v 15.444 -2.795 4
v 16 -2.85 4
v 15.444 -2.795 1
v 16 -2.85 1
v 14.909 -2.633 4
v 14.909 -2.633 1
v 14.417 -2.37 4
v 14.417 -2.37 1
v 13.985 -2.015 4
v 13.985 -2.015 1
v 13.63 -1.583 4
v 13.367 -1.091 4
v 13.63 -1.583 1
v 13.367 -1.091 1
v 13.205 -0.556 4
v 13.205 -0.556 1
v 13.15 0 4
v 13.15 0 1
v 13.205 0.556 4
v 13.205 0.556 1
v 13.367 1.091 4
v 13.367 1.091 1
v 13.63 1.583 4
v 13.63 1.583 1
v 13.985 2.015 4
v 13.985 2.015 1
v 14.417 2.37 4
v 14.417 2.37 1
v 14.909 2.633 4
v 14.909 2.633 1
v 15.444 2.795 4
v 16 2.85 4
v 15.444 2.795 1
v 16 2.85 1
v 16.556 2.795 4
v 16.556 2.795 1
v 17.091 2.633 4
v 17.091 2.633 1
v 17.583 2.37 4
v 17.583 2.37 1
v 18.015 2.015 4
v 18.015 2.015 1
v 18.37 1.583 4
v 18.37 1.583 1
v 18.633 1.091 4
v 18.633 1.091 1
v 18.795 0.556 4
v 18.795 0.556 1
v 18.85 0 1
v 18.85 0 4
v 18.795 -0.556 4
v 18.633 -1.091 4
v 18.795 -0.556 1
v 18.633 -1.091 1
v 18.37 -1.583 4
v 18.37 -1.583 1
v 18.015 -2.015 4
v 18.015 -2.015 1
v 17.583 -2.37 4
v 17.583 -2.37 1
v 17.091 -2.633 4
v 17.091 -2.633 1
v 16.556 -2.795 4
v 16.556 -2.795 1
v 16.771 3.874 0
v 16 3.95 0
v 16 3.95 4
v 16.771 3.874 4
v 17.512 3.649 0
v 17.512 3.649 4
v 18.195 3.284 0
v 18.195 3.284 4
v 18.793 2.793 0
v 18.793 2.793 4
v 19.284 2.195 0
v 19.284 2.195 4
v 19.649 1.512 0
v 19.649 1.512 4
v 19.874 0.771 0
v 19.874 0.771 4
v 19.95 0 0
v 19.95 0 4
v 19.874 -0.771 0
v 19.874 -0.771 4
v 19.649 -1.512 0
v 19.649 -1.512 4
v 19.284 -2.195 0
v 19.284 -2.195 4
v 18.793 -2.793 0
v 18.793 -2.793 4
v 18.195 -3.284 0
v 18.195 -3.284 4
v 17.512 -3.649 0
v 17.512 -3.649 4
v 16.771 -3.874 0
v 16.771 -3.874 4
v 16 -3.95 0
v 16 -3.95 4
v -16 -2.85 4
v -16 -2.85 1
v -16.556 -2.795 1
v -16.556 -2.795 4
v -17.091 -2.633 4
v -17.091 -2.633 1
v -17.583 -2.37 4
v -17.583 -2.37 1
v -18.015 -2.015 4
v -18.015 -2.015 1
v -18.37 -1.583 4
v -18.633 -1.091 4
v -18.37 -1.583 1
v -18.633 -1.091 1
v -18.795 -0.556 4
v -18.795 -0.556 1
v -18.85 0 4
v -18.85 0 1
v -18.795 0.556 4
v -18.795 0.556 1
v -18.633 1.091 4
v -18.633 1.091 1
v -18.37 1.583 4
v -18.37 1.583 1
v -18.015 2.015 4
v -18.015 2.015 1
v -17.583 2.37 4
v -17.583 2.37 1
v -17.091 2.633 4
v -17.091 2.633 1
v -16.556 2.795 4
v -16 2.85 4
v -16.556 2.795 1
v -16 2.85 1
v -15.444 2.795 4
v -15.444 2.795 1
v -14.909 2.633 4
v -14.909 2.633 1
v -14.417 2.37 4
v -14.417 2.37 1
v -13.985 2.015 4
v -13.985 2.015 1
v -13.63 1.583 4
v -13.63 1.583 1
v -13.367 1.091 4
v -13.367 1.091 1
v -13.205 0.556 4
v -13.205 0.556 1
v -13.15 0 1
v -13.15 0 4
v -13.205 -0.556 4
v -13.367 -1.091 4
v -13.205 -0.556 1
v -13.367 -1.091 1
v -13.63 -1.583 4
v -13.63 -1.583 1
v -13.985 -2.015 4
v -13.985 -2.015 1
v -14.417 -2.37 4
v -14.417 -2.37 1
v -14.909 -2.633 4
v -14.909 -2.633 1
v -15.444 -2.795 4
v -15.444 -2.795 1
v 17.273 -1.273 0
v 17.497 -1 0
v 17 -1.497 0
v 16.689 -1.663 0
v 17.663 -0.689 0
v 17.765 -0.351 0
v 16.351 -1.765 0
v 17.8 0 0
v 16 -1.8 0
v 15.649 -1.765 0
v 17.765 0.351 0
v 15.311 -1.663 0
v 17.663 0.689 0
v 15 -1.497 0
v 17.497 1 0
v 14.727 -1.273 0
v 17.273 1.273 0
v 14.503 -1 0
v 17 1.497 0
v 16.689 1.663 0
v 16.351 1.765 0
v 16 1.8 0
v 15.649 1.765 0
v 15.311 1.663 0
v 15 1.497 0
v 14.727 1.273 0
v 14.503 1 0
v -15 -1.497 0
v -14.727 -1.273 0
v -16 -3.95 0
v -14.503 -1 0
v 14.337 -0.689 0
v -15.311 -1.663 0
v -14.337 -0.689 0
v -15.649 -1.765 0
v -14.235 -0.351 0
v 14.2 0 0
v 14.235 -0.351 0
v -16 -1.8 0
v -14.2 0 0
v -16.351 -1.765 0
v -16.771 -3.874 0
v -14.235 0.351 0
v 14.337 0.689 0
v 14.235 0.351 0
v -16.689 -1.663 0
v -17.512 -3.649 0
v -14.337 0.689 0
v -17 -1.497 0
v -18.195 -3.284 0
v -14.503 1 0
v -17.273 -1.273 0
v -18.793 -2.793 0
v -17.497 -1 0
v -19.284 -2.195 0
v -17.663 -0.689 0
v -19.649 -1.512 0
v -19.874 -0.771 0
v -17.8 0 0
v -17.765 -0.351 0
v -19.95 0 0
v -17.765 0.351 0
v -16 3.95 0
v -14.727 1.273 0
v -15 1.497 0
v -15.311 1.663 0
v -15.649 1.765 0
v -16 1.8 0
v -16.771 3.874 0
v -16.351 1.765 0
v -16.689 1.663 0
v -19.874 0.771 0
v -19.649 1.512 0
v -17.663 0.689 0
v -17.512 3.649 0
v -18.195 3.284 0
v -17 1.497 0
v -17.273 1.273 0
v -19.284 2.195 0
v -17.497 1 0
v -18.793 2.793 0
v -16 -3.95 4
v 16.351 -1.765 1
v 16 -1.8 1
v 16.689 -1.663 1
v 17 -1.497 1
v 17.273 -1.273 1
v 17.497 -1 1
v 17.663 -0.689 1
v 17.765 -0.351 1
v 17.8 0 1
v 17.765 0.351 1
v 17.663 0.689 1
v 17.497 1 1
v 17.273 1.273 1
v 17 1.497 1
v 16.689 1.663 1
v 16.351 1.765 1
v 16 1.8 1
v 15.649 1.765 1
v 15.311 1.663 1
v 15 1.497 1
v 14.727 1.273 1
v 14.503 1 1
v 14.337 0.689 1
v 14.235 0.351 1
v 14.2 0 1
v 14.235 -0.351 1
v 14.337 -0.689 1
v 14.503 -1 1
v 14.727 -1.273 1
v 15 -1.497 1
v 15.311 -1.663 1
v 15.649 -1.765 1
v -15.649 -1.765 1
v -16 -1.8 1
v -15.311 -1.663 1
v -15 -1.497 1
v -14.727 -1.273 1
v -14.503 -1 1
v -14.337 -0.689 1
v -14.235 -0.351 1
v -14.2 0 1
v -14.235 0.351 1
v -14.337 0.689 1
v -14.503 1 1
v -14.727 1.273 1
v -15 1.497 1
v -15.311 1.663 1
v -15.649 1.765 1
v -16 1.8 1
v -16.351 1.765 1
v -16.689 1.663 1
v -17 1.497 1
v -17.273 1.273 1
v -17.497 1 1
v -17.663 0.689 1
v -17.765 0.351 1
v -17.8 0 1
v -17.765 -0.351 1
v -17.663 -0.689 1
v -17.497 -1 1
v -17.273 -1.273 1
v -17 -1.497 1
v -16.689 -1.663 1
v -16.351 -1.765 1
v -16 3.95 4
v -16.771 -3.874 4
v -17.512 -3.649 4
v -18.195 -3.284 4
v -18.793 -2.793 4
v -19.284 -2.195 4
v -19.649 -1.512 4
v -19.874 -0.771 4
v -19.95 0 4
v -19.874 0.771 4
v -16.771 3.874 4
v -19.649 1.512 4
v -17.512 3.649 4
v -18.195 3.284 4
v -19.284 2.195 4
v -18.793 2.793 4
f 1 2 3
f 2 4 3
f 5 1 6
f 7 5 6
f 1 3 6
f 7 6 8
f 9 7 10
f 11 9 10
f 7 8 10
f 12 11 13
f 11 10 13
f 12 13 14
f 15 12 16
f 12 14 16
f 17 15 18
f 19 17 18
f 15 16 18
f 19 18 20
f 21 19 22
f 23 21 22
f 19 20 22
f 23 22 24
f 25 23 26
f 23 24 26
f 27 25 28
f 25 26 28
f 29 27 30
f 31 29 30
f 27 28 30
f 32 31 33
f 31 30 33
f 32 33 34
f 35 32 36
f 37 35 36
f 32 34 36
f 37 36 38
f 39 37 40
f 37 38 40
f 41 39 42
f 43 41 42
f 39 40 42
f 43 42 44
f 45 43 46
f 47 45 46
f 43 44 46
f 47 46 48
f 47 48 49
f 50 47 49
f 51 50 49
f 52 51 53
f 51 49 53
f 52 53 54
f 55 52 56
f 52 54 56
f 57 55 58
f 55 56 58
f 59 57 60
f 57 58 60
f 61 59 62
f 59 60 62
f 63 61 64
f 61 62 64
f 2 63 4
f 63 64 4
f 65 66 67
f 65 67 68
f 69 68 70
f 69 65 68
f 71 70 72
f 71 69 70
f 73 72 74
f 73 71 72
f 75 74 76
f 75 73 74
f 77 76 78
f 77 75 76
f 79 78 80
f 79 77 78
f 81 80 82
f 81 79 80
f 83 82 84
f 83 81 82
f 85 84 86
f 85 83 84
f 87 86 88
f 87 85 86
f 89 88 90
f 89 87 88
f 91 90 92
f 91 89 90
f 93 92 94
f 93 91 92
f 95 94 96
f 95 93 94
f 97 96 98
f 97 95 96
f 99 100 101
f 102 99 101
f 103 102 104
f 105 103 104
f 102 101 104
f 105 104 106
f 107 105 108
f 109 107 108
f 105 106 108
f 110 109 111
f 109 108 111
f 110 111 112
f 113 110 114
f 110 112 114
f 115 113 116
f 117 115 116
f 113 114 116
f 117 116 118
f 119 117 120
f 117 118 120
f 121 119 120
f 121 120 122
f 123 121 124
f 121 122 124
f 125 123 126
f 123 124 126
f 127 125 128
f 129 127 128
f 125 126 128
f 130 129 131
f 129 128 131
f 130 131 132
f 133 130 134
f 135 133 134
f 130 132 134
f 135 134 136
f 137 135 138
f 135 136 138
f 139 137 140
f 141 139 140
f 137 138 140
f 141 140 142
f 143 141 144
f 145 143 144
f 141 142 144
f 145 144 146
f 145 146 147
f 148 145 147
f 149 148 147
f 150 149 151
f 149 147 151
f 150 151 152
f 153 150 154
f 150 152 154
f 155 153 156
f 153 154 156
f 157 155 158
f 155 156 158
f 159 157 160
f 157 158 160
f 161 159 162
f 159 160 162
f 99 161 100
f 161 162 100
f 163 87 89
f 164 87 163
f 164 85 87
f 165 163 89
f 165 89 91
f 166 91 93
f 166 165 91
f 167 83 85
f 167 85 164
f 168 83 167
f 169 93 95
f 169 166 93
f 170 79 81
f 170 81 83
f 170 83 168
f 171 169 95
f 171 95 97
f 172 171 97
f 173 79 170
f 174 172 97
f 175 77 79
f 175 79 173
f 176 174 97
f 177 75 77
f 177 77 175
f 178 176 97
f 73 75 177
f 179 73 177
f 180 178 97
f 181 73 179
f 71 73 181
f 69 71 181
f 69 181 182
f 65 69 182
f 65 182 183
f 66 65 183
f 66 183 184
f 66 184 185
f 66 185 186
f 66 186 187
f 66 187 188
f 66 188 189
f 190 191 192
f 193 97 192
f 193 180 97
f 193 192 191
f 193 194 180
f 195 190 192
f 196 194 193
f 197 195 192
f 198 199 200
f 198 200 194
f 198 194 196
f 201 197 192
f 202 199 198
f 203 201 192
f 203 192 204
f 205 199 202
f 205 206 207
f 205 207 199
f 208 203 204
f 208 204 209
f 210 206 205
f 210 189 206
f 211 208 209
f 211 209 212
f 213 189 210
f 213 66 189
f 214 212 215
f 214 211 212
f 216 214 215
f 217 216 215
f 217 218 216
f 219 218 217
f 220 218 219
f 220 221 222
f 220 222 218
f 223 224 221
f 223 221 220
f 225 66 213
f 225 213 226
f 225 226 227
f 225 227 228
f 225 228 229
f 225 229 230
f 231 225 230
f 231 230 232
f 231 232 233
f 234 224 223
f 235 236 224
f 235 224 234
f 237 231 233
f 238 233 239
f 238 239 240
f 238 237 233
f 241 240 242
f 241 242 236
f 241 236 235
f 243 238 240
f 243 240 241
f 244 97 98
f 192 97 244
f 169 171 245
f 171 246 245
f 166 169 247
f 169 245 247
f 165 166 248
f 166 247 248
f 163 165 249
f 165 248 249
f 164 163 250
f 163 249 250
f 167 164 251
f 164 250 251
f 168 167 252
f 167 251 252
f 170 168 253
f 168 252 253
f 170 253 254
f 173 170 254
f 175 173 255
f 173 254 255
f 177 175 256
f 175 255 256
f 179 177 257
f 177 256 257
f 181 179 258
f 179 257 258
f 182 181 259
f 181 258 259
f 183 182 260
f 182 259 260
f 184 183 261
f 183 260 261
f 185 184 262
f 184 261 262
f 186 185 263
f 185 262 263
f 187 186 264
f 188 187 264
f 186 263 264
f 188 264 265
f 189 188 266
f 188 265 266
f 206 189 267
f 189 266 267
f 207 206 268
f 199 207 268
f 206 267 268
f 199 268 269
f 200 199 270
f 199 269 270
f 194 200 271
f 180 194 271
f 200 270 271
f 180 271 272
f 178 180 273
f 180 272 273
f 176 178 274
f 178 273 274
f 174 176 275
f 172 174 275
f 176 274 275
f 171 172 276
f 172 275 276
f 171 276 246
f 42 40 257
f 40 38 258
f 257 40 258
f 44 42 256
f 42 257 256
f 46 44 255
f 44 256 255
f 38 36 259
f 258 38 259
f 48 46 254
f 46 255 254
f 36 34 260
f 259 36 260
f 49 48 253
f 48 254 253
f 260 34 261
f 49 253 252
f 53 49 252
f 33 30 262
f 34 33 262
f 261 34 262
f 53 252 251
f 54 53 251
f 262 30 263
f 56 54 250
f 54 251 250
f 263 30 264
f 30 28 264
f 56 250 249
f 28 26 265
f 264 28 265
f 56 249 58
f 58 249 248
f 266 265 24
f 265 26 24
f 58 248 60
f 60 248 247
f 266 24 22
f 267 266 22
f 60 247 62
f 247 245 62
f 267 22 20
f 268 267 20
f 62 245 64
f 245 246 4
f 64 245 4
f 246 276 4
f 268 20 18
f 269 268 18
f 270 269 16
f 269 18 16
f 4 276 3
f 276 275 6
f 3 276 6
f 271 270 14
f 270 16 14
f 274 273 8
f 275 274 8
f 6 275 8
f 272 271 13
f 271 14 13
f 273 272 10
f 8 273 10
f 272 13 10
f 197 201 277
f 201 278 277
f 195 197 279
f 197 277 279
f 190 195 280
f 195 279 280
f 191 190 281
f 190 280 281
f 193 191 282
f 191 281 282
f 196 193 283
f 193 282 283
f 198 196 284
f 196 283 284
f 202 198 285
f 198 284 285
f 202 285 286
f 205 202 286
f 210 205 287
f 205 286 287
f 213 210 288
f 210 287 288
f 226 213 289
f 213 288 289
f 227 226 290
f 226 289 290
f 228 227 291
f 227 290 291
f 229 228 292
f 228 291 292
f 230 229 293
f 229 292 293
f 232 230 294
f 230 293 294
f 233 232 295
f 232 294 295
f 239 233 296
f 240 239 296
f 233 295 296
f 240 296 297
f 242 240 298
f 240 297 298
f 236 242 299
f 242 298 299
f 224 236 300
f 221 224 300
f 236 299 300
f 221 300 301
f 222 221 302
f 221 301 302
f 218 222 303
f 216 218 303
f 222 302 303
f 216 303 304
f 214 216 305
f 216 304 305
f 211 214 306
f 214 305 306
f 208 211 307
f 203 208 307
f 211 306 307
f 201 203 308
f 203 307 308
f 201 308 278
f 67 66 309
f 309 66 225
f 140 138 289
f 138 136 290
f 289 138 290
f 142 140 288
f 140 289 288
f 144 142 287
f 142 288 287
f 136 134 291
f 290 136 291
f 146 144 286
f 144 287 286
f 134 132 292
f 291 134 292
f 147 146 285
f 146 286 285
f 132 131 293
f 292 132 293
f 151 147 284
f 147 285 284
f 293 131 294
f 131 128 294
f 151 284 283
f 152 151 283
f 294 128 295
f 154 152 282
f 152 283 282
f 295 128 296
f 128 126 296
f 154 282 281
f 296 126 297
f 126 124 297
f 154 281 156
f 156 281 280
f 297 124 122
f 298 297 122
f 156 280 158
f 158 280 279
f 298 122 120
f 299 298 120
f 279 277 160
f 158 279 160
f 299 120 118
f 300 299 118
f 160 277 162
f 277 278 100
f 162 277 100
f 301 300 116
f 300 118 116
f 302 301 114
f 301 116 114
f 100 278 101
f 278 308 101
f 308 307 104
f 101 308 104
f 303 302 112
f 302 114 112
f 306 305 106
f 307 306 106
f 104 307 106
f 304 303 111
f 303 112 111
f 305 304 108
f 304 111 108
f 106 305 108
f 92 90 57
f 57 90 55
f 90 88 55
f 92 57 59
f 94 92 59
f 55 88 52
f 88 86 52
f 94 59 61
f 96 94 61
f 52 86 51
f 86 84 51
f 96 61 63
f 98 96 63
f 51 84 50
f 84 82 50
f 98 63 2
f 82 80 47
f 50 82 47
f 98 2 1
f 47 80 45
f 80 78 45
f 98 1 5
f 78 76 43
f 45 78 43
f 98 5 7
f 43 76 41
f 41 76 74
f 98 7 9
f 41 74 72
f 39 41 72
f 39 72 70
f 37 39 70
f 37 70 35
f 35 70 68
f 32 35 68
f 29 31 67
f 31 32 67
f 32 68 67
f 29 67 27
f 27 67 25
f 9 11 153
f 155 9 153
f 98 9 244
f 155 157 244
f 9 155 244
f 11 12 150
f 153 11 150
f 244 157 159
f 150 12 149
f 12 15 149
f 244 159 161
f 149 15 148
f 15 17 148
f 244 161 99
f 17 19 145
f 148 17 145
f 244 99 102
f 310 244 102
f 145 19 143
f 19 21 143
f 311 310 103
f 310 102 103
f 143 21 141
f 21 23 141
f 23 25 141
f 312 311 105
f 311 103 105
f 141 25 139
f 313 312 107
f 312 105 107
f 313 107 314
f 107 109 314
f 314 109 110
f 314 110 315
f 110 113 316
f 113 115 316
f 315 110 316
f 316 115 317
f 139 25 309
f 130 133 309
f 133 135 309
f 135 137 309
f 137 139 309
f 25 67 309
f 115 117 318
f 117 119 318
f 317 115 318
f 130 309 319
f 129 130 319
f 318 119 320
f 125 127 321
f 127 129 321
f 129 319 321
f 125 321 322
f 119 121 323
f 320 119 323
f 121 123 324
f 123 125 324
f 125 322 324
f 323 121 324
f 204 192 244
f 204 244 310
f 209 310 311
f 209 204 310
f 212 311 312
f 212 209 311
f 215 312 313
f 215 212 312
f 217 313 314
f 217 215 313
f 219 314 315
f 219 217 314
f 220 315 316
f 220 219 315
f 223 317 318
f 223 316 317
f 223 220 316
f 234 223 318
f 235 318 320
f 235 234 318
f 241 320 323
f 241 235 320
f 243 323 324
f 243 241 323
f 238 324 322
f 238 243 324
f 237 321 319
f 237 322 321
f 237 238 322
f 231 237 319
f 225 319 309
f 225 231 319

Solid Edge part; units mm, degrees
sketch "Sketch1" plane through (0, 0, 0) normal (0, 0, 1) x (1, 0, 0)
  arc A0 (16, 3.95) -> (16, -3.95) centre (16, 0) cw
  line L0 (16, -3.95) -> (-16, -3.95)
  arc A1 (-16, 3.95) -> (-16, -3.95) centre (-16, 0) ccw
  line L1 (16, 3.95) -> (-16, 3.95)
extrude "Protrusion1" add sketch "Sketch1" along normal blind 4
hole "Hole_3" at (-16, 0, 4) direction (0, 0, -1) diameter 3.6 end up to next
hole "Hole1" at (16, 0, 4) direction (0, 0, -1) diameter 3.6 end up to next
hole "Hole_5" at (-16, 0, 4) direction (0, 0, -1) diameter 5.7 depth 3
hole "Hole2" at (16, 0, 4) direction (0, 0, -1) diameter 5.7 depth 3
